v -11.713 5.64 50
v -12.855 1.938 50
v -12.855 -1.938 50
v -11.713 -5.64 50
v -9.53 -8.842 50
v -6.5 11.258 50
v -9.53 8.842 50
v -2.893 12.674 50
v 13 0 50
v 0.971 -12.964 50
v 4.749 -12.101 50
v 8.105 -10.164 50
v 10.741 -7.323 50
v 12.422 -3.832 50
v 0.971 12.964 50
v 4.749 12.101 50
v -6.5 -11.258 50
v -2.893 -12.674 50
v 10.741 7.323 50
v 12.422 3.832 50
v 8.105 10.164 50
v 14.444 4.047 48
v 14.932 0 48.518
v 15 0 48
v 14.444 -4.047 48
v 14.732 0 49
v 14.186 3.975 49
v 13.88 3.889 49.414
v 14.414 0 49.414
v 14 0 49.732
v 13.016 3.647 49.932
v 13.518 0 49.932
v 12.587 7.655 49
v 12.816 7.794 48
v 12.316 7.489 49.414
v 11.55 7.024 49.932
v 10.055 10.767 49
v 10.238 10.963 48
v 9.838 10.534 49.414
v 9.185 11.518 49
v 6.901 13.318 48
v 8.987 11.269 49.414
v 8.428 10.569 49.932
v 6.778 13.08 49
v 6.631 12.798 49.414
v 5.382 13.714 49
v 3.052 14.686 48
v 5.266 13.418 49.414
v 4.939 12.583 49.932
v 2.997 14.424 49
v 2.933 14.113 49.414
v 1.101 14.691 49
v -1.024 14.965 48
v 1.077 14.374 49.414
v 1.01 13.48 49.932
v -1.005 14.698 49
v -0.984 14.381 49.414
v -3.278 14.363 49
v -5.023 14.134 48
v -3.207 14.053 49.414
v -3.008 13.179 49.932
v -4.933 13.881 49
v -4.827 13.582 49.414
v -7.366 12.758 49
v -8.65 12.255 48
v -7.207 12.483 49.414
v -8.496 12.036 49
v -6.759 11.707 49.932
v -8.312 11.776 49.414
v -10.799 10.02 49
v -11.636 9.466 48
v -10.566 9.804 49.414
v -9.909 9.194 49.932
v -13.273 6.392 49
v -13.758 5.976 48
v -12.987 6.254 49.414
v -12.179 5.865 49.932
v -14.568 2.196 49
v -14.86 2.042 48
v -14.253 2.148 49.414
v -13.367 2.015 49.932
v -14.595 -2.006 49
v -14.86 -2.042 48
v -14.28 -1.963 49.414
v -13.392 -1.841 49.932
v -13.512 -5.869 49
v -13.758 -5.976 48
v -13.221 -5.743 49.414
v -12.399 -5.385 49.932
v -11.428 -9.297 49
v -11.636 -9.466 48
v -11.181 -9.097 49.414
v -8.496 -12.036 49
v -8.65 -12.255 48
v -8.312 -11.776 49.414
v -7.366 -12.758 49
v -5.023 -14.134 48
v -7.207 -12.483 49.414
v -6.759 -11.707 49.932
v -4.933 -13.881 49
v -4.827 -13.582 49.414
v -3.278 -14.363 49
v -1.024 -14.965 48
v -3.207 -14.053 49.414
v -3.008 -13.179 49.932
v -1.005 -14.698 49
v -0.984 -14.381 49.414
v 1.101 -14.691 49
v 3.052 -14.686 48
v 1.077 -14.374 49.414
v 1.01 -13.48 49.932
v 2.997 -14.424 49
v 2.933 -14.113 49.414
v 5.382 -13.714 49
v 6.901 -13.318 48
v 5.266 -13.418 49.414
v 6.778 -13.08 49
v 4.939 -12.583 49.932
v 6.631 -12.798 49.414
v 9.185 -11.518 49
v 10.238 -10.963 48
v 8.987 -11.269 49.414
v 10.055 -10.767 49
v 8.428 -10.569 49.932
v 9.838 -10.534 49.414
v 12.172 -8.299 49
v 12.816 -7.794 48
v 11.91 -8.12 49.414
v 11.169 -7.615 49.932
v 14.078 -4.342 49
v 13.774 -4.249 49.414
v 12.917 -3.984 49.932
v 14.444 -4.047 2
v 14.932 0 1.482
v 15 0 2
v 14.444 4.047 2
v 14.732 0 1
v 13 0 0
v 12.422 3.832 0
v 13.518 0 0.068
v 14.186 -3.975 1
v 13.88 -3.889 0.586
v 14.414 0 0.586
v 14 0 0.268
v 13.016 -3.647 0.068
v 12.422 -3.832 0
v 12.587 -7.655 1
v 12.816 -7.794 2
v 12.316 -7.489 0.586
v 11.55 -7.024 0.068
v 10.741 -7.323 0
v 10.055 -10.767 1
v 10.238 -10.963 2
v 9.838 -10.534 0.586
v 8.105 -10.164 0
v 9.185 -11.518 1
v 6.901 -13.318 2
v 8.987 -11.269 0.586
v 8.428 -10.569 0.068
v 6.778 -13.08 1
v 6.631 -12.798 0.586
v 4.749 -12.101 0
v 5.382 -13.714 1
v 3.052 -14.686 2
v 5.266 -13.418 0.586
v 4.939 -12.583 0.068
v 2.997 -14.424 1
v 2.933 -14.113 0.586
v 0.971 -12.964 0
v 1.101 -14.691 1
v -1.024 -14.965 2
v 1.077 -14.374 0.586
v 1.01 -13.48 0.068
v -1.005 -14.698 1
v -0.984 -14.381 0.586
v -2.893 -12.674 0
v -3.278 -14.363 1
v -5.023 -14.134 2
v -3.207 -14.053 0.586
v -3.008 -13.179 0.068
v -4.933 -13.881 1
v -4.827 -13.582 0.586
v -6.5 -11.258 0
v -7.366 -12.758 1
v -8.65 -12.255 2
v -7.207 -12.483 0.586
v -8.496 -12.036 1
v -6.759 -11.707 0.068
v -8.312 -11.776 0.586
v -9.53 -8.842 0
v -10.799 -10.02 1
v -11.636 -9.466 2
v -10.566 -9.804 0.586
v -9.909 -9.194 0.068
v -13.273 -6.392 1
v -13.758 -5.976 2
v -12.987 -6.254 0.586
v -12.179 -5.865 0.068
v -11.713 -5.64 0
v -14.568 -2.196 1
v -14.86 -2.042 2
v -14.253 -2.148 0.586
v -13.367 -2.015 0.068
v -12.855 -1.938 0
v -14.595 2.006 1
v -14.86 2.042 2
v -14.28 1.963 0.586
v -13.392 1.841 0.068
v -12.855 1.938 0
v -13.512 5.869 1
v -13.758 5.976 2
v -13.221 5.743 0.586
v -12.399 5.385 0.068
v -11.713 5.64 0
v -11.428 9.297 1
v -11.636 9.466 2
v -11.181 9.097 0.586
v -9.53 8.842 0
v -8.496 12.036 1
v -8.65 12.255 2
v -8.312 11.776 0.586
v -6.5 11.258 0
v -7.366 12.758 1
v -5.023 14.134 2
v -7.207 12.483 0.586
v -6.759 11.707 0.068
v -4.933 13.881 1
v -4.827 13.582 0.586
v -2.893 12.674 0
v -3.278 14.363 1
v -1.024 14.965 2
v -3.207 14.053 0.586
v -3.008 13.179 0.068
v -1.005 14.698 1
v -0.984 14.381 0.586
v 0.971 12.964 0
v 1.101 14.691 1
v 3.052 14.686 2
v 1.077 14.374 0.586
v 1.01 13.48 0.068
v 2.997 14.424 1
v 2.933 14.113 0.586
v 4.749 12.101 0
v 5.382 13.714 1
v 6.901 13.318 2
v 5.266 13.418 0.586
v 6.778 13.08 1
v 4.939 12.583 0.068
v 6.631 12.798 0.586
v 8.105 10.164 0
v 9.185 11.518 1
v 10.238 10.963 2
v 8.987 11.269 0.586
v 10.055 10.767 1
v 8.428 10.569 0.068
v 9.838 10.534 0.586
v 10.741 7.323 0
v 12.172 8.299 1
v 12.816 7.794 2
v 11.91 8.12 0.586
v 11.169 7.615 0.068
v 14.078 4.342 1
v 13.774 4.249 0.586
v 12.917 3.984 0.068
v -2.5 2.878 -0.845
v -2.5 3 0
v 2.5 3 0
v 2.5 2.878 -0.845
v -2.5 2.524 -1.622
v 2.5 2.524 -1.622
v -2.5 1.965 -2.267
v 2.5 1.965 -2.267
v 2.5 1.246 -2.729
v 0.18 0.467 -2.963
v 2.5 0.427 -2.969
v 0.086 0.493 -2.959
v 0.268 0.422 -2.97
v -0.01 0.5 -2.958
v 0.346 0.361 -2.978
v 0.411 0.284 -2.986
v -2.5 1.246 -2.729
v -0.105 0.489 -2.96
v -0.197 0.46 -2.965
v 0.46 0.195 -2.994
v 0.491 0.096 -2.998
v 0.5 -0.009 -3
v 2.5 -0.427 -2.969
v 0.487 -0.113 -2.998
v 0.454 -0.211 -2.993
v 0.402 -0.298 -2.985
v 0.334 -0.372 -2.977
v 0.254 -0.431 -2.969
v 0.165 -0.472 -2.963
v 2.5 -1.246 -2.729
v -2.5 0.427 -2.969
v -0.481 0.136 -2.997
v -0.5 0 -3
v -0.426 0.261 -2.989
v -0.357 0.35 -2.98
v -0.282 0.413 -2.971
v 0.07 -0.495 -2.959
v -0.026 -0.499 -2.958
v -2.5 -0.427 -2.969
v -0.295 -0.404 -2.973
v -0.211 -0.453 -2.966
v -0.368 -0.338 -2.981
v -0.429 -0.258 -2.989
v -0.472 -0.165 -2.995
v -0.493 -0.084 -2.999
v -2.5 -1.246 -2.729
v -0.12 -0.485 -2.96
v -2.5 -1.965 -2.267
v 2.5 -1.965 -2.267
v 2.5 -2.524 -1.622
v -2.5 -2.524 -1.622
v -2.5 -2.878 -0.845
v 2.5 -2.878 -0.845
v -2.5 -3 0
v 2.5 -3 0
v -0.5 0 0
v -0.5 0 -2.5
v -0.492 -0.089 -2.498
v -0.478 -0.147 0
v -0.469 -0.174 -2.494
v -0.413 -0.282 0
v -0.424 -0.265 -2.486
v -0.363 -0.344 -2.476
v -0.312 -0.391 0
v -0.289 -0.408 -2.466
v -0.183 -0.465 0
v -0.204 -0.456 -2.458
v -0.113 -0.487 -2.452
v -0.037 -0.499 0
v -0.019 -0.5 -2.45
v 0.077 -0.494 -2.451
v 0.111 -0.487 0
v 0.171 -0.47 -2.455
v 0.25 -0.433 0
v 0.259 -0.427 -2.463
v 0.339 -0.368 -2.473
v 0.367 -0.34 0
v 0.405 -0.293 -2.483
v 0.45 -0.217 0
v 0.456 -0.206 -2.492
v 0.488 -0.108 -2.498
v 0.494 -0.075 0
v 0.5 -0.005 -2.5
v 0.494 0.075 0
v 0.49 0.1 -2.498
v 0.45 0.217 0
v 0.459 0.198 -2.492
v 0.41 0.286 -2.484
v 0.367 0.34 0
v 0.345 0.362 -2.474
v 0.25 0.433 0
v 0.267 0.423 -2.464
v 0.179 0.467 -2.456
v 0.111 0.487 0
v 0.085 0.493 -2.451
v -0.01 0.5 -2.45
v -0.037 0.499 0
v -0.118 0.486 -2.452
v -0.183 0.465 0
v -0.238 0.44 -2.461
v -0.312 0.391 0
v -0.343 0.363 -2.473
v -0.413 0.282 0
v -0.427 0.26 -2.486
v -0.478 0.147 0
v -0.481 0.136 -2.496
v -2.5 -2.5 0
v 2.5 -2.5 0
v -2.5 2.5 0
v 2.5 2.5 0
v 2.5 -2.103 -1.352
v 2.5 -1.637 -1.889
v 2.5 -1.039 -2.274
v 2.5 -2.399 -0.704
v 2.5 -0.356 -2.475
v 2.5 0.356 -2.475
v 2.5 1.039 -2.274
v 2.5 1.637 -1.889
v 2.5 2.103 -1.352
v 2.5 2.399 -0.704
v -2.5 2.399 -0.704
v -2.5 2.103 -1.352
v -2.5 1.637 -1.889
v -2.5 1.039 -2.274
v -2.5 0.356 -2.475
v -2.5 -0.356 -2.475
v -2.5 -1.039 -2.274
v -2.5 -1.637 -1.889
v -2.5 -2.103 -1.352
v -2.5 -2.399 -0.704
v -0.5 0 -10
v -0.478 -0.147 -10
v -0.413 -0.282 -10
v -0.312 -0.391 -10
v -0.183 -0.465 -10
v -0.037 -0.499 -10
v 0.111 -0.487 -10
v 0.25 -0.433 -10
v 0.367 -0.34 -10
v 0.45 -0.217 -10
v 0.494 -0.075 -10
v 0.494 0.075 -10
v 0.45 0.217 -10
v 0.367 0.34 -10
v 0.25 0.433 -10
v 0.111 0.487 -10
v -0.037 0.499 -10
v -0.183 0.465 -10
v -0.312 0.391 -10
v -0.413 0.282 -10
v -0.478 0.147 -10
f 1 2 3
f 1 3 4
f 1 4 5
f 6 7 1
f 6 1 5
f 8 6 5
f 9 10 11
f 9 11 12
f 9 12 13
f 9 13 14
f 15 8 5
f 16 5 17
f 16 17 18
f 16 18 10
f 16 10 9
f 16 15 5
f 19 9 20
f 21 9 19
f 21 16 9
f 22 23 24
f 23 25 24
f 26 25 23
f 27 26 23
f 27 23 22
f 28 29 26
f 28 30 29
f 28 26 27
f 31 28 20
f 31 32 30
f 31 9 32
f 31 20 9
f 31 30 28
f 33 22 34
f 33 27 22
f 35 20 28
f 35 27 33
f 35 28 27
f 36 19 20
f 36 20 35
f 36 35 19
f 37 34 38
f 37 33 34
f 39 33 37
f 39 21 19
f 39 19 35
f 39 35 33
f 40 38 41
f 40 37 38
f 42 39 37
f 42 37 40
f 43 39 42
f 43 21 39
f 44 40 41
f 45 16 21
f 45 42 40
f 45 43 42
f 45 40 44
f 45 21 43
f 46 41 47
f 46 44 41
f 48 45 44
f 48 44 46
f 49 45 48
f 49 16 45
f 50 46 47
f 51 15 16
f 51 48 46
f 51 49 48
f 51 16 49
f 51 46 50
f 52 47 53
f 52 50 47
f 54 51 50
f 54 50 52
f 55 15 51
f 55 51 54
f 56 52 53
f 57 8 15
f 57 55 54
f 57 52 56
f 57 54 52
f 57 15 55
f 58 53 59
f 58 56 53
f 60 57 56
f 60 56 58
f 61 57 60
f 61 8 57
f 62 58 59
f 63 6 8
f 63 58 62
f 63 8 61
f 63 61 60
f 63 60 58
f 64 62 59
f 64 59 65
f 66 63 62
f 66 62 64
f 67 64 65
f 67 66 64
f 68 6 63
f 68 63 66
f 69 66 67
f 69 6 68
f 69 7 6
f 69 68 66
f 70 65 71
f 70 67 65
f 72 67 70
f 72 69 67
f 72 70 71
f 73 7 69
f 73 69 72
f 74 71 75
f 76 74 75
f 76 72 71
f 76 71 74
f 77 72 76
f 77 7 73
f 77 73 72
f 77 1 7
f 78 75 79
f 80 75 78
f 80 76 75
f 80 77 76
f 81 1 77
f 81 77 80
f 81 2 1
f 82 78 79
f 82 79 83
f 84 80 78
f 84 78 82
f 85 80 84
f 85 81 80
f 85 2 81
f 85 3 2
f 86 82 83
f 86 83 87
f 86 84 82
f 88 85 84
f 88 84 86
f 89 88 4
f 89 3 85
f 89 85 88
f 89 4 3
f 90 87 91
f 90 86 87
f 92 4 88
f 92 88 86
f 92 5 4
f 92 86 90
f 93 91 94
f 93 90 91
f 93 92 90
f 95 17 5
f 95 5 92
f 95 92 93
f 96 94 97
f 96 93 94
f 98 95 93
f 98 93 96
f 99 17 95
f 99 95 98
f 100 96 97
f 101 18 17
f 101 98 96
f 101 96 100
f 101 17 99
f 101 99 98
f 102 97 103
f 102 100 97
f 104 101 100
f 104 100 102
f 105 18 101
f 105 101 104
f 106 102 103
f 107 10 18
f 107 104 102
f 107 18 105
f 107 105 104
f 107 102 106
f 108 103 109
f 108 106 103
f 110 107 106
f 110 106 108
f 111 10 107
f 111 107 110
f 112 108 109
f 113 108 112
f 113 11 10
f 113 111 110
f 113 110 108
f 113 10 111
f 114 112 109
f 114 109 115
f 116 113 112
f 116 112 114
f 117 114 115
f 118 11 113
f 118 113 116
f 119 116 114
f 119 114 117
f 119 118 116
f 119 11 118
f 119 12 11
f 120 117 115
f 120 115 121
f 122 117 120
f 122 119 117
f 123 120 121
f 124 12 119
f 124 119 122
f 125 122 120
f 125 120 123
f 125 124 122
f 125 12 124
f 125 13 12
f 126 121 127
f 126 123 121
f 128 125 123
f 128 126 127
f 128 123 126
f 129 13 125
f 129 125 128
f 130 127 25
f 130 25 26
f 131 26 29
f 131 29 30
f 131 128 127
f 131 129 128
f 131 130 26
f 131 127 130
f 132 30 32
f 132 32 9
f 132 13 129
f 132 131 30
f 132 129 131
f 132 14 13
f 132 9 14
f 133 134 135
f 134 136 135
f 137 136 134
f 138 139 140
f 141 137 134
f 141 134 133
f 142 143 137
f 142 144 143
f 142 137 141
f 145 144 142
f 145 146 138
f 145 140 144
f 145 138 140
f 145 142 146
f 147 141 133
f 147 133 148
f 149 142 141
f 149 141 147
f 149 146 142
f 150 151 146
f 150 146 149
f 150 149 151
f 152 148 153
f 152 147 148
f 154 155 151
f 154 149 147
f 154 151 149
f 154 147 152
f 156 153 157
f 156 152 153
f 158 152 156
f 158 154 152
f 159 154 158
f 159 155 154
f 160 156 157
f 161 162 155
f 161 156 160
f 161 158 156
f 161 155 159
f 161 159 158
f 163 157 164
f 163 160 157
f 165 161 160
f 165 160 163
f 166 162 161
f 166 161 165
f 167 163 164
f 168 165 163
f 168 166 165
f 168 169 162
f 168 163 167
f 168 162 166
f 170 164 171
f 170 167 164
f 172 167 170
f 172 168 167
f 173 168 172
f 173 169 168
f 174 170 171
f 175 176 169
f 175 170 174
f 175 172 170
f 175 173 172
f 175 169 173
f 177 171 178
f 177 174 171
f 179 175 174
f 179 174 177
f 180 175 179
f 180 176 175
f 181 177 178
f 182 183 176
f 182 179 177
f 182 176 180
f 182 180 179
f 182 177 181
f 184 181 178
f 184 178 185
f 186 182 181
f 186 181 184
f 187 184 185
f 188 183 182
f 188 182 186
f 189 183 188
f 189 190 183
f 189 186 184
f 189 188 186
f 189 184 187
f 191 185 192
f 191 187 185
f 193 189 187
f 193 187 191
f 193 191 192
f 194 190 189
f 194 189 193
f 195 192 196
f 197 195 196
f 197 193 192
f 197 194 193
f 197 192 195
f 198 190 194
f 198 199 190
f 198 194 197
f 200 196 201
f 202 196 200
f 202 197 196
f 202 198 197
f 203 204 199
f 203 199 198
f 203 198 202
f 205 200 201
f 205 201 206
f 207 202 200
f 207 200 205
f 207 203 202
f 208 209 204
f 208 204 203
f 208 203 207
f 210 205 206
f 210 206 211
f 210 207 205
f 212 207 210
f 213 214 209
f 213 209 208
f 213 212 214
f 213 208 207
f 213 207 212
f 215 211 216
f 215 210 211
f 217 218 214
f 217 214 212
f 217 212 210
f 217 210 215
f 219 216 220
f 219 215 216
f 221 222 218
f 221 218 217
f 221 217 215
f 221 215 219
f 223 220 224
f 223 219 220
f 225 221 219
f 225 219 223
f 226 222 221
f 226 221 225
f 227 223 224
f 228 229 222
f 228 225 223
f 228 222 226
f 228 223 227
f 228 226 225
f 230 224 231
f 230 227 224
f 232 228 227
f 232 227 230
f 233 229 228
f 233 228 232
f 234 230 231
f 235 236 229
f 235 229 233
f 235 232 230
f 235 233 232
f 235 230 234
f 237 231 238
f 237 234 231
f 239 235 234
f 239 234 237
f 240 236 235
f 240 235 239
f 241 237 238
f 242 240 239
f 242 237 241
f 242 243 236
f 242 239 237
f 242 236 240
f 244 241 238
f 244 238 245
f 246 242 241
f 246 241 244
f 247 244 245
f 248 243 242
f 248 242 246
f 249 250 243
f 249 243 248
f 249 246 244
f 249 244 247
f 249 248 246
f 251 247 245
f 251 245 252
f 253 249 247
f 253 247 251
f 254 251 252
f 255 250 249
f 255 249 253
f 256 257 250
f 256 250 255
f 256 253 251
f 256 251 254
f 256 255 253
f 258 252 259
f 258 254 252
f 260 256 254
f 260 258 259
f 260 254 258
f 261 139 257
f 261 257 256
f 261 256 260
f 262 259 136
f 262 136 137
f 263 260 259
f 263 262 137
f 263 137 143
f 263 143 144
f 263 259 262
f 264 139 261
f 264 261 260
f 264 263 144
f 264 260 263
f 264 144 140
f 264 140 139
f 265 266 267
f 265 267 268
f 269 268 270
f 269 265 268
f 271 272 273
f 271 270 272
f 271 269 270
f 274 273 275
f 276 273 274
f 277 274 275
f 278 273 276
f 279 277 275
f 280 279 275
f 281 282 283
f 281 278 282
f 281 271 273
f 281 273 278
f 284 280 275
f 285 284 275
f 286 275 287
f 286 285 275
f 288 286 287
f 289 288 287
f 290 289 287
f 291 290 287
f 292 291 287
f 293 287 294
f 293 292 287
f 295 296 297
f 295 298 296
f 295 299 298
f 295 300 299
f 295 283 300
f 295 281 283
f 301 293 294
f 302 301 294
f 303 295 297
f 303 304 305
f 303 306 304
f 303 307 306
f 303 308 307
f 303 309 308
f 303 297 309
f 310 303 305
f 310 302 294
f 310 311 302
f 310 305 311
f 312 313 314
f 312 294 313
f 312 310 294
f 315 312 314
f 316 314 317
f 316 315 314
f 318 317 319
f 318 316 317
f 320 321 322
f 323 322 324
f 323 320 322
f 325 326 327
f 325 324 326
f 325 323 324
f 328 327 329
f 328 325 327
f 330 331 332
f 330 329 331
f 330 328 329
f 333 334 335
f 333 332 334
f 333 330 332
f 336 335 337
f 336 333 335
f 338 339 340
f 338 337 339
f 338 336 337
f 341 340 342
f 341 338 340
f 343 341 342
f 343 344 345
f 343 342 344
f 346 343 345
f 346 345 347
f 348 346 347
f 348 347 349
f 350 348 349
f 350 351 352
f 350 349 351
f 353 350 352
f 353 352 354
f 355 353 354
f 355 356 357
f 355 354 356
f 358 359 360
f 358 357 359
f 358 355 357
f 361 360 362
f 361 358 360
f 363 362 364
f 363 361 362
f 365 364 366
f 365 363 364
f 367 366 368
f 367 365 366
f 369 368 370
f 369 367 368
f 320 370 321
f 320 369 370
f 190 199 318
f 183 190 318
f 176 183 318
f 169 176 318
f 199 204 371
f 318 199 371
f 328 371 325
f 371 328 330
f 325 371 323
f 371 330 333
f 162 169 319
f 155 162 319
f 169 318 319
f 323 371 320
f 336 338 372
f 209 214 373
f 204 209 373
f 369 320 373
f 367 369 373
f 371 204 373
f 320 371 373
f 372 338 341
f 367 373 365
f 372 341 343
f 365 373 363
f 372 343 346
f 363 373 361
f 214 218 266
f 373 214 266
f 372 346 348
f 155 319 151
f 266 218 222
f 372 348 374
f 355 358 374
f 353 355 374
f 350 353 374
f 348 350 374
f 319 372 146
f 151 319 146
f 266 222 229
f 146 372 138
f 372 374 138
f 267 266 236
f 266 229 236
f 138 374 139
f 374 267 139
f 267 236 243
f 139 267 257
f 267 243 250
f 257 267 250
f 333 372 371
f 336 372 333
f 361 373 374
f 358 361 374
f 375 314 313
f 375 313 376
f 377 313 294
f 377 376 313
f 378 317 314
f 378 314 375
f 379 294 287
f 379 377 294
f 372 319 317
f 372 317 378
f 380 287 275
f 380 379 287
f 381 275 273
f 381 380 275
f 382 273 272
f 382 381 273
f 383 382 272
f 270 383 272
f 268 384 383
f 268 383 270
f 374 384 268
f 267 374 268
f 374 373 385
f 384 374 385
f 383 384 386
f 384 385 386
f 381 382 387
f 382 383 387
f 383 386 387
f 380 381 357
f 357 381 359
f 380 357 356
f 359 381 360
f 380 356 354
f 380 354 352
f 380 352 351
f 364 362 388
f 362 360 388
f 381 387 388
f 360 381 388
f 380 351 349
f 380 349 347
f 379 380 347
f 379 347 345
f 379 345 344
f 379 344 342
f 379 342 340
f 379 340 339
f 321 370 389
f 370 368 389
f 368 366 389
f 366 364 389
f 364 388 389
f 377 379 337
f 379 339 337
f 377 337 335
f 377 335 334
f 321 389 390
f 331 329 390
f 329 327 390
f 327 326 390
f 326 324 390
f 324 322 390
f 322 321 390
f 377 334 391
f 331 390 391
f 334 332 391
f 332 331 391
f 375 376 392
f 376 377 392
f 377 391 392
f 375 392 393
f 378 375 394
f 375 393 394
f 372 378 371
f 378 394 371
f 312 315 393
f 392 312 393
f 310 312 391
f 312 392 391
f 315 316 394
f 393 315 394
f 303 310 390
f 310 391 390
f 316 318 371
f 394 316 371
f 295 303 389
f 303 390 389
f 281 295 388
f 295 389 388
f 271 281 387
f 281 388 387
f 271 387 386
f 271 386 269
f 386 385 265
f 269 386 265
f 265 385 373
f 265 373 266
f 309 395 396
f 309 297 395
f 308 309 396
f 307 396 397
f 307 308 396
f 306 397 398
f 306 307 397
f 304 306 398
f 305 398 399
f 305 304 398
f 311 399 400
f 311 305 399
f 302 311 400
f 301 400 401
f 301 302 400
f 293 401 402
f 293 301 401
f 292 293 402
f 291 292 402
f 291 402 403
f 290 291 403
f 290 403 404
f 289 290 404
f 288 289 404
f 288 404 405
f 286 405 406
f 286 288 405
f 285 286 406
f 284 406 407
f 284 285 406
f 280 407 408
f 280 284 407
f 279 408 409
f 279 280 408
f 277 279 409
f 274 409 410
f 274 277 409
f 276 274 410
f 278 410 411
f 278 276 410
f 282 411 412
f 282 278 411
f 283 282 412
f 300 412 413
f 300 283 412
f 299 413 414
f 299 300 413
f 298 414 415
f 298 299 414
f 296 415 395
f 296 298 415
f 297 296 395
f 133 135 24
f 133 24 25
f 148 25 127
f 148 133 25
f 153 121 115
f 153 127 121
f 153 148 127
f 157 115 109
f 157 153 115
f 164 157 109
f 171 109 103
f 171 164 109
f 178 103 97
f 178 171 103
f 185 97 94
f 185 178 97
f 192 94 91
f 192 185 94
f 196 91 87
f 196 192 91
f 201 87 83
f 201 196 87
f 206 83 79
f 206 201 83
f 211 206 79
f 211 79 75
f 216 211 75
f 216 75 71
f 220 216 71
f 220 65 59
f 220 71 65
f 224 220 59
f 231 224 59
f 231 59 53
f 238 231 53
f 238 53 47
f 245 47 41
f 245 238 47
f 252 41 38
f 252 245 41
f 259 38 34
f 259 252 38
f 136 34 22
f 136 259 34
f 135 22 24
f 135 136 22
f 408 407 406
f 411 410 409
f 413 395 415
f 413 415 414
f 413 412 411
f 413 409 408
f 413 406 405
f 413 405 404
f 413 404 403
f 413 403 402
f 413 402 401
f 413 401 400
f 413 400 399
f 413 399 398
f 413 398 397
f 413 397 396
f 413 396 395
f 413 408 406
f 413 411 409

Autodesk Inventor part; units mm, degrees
ref_plane "YZ Plane" through (0, 0, 0) normal (1, 0, 0) x (0, 1, 0)
ref_plane "XZ Plane" through (0, 0, 0) normal (0, 1, 0) x (-1, 0, 0)
ref_plane "XY Plane" through (0, 0, 0) normal (0, 0, 1) x (1, 0, 0)
sketch "Sketch1" plane through (0, 0, 0) normal (0, 0, 1) x (1, 0, 0)
  circle A0 centre (0, 0) radius 15
  dimension "d0" = 30
extrude "Extrusion1" add sketch "Sketch1" along normal blind 50
sketch "Sketch2" plane through (0, 0, 50) normal (0, 0, 1) x (1, 0, 0)
  point P0 (0, 0)
sketch "Sketch3" plane through (0, 0, 0) normal (1, 0, 0) x (0, 1, 0)
  arc A0 (-2.5, 0) -> (2.5, 0) centre (0, 0) ccw
  arc A1 (-3, 0) -> (3, 0) centre (0, 0) ccw
  line L0 (-15, 0) -> (15, 0) projected
  line L1 (3, 0) -> (2.5, 0)
  line L2 (-2.5, 0) -> (-3, 0)
  dimension "d3" = 5
  dimension "d4" = 6
extrude "Extrusion2" add sketch "Sketch3" along normal mid plane 5 contours A0 L0 A1
fillet "Fillet1" radius 2 2 edges at (-15, 0, 50) (-15, 0, 0)
sketch "Sketch4" plane through (0, 0, 0) normal (0, 0, -1) x (-1, 0, 0)
  circle A0 centre (0, 0) radius 0.5
  dimension "d8" = 1
extrude "Extrusion3" add sketch "Sketch4" along normal blind 10
properties part number "weigth"
